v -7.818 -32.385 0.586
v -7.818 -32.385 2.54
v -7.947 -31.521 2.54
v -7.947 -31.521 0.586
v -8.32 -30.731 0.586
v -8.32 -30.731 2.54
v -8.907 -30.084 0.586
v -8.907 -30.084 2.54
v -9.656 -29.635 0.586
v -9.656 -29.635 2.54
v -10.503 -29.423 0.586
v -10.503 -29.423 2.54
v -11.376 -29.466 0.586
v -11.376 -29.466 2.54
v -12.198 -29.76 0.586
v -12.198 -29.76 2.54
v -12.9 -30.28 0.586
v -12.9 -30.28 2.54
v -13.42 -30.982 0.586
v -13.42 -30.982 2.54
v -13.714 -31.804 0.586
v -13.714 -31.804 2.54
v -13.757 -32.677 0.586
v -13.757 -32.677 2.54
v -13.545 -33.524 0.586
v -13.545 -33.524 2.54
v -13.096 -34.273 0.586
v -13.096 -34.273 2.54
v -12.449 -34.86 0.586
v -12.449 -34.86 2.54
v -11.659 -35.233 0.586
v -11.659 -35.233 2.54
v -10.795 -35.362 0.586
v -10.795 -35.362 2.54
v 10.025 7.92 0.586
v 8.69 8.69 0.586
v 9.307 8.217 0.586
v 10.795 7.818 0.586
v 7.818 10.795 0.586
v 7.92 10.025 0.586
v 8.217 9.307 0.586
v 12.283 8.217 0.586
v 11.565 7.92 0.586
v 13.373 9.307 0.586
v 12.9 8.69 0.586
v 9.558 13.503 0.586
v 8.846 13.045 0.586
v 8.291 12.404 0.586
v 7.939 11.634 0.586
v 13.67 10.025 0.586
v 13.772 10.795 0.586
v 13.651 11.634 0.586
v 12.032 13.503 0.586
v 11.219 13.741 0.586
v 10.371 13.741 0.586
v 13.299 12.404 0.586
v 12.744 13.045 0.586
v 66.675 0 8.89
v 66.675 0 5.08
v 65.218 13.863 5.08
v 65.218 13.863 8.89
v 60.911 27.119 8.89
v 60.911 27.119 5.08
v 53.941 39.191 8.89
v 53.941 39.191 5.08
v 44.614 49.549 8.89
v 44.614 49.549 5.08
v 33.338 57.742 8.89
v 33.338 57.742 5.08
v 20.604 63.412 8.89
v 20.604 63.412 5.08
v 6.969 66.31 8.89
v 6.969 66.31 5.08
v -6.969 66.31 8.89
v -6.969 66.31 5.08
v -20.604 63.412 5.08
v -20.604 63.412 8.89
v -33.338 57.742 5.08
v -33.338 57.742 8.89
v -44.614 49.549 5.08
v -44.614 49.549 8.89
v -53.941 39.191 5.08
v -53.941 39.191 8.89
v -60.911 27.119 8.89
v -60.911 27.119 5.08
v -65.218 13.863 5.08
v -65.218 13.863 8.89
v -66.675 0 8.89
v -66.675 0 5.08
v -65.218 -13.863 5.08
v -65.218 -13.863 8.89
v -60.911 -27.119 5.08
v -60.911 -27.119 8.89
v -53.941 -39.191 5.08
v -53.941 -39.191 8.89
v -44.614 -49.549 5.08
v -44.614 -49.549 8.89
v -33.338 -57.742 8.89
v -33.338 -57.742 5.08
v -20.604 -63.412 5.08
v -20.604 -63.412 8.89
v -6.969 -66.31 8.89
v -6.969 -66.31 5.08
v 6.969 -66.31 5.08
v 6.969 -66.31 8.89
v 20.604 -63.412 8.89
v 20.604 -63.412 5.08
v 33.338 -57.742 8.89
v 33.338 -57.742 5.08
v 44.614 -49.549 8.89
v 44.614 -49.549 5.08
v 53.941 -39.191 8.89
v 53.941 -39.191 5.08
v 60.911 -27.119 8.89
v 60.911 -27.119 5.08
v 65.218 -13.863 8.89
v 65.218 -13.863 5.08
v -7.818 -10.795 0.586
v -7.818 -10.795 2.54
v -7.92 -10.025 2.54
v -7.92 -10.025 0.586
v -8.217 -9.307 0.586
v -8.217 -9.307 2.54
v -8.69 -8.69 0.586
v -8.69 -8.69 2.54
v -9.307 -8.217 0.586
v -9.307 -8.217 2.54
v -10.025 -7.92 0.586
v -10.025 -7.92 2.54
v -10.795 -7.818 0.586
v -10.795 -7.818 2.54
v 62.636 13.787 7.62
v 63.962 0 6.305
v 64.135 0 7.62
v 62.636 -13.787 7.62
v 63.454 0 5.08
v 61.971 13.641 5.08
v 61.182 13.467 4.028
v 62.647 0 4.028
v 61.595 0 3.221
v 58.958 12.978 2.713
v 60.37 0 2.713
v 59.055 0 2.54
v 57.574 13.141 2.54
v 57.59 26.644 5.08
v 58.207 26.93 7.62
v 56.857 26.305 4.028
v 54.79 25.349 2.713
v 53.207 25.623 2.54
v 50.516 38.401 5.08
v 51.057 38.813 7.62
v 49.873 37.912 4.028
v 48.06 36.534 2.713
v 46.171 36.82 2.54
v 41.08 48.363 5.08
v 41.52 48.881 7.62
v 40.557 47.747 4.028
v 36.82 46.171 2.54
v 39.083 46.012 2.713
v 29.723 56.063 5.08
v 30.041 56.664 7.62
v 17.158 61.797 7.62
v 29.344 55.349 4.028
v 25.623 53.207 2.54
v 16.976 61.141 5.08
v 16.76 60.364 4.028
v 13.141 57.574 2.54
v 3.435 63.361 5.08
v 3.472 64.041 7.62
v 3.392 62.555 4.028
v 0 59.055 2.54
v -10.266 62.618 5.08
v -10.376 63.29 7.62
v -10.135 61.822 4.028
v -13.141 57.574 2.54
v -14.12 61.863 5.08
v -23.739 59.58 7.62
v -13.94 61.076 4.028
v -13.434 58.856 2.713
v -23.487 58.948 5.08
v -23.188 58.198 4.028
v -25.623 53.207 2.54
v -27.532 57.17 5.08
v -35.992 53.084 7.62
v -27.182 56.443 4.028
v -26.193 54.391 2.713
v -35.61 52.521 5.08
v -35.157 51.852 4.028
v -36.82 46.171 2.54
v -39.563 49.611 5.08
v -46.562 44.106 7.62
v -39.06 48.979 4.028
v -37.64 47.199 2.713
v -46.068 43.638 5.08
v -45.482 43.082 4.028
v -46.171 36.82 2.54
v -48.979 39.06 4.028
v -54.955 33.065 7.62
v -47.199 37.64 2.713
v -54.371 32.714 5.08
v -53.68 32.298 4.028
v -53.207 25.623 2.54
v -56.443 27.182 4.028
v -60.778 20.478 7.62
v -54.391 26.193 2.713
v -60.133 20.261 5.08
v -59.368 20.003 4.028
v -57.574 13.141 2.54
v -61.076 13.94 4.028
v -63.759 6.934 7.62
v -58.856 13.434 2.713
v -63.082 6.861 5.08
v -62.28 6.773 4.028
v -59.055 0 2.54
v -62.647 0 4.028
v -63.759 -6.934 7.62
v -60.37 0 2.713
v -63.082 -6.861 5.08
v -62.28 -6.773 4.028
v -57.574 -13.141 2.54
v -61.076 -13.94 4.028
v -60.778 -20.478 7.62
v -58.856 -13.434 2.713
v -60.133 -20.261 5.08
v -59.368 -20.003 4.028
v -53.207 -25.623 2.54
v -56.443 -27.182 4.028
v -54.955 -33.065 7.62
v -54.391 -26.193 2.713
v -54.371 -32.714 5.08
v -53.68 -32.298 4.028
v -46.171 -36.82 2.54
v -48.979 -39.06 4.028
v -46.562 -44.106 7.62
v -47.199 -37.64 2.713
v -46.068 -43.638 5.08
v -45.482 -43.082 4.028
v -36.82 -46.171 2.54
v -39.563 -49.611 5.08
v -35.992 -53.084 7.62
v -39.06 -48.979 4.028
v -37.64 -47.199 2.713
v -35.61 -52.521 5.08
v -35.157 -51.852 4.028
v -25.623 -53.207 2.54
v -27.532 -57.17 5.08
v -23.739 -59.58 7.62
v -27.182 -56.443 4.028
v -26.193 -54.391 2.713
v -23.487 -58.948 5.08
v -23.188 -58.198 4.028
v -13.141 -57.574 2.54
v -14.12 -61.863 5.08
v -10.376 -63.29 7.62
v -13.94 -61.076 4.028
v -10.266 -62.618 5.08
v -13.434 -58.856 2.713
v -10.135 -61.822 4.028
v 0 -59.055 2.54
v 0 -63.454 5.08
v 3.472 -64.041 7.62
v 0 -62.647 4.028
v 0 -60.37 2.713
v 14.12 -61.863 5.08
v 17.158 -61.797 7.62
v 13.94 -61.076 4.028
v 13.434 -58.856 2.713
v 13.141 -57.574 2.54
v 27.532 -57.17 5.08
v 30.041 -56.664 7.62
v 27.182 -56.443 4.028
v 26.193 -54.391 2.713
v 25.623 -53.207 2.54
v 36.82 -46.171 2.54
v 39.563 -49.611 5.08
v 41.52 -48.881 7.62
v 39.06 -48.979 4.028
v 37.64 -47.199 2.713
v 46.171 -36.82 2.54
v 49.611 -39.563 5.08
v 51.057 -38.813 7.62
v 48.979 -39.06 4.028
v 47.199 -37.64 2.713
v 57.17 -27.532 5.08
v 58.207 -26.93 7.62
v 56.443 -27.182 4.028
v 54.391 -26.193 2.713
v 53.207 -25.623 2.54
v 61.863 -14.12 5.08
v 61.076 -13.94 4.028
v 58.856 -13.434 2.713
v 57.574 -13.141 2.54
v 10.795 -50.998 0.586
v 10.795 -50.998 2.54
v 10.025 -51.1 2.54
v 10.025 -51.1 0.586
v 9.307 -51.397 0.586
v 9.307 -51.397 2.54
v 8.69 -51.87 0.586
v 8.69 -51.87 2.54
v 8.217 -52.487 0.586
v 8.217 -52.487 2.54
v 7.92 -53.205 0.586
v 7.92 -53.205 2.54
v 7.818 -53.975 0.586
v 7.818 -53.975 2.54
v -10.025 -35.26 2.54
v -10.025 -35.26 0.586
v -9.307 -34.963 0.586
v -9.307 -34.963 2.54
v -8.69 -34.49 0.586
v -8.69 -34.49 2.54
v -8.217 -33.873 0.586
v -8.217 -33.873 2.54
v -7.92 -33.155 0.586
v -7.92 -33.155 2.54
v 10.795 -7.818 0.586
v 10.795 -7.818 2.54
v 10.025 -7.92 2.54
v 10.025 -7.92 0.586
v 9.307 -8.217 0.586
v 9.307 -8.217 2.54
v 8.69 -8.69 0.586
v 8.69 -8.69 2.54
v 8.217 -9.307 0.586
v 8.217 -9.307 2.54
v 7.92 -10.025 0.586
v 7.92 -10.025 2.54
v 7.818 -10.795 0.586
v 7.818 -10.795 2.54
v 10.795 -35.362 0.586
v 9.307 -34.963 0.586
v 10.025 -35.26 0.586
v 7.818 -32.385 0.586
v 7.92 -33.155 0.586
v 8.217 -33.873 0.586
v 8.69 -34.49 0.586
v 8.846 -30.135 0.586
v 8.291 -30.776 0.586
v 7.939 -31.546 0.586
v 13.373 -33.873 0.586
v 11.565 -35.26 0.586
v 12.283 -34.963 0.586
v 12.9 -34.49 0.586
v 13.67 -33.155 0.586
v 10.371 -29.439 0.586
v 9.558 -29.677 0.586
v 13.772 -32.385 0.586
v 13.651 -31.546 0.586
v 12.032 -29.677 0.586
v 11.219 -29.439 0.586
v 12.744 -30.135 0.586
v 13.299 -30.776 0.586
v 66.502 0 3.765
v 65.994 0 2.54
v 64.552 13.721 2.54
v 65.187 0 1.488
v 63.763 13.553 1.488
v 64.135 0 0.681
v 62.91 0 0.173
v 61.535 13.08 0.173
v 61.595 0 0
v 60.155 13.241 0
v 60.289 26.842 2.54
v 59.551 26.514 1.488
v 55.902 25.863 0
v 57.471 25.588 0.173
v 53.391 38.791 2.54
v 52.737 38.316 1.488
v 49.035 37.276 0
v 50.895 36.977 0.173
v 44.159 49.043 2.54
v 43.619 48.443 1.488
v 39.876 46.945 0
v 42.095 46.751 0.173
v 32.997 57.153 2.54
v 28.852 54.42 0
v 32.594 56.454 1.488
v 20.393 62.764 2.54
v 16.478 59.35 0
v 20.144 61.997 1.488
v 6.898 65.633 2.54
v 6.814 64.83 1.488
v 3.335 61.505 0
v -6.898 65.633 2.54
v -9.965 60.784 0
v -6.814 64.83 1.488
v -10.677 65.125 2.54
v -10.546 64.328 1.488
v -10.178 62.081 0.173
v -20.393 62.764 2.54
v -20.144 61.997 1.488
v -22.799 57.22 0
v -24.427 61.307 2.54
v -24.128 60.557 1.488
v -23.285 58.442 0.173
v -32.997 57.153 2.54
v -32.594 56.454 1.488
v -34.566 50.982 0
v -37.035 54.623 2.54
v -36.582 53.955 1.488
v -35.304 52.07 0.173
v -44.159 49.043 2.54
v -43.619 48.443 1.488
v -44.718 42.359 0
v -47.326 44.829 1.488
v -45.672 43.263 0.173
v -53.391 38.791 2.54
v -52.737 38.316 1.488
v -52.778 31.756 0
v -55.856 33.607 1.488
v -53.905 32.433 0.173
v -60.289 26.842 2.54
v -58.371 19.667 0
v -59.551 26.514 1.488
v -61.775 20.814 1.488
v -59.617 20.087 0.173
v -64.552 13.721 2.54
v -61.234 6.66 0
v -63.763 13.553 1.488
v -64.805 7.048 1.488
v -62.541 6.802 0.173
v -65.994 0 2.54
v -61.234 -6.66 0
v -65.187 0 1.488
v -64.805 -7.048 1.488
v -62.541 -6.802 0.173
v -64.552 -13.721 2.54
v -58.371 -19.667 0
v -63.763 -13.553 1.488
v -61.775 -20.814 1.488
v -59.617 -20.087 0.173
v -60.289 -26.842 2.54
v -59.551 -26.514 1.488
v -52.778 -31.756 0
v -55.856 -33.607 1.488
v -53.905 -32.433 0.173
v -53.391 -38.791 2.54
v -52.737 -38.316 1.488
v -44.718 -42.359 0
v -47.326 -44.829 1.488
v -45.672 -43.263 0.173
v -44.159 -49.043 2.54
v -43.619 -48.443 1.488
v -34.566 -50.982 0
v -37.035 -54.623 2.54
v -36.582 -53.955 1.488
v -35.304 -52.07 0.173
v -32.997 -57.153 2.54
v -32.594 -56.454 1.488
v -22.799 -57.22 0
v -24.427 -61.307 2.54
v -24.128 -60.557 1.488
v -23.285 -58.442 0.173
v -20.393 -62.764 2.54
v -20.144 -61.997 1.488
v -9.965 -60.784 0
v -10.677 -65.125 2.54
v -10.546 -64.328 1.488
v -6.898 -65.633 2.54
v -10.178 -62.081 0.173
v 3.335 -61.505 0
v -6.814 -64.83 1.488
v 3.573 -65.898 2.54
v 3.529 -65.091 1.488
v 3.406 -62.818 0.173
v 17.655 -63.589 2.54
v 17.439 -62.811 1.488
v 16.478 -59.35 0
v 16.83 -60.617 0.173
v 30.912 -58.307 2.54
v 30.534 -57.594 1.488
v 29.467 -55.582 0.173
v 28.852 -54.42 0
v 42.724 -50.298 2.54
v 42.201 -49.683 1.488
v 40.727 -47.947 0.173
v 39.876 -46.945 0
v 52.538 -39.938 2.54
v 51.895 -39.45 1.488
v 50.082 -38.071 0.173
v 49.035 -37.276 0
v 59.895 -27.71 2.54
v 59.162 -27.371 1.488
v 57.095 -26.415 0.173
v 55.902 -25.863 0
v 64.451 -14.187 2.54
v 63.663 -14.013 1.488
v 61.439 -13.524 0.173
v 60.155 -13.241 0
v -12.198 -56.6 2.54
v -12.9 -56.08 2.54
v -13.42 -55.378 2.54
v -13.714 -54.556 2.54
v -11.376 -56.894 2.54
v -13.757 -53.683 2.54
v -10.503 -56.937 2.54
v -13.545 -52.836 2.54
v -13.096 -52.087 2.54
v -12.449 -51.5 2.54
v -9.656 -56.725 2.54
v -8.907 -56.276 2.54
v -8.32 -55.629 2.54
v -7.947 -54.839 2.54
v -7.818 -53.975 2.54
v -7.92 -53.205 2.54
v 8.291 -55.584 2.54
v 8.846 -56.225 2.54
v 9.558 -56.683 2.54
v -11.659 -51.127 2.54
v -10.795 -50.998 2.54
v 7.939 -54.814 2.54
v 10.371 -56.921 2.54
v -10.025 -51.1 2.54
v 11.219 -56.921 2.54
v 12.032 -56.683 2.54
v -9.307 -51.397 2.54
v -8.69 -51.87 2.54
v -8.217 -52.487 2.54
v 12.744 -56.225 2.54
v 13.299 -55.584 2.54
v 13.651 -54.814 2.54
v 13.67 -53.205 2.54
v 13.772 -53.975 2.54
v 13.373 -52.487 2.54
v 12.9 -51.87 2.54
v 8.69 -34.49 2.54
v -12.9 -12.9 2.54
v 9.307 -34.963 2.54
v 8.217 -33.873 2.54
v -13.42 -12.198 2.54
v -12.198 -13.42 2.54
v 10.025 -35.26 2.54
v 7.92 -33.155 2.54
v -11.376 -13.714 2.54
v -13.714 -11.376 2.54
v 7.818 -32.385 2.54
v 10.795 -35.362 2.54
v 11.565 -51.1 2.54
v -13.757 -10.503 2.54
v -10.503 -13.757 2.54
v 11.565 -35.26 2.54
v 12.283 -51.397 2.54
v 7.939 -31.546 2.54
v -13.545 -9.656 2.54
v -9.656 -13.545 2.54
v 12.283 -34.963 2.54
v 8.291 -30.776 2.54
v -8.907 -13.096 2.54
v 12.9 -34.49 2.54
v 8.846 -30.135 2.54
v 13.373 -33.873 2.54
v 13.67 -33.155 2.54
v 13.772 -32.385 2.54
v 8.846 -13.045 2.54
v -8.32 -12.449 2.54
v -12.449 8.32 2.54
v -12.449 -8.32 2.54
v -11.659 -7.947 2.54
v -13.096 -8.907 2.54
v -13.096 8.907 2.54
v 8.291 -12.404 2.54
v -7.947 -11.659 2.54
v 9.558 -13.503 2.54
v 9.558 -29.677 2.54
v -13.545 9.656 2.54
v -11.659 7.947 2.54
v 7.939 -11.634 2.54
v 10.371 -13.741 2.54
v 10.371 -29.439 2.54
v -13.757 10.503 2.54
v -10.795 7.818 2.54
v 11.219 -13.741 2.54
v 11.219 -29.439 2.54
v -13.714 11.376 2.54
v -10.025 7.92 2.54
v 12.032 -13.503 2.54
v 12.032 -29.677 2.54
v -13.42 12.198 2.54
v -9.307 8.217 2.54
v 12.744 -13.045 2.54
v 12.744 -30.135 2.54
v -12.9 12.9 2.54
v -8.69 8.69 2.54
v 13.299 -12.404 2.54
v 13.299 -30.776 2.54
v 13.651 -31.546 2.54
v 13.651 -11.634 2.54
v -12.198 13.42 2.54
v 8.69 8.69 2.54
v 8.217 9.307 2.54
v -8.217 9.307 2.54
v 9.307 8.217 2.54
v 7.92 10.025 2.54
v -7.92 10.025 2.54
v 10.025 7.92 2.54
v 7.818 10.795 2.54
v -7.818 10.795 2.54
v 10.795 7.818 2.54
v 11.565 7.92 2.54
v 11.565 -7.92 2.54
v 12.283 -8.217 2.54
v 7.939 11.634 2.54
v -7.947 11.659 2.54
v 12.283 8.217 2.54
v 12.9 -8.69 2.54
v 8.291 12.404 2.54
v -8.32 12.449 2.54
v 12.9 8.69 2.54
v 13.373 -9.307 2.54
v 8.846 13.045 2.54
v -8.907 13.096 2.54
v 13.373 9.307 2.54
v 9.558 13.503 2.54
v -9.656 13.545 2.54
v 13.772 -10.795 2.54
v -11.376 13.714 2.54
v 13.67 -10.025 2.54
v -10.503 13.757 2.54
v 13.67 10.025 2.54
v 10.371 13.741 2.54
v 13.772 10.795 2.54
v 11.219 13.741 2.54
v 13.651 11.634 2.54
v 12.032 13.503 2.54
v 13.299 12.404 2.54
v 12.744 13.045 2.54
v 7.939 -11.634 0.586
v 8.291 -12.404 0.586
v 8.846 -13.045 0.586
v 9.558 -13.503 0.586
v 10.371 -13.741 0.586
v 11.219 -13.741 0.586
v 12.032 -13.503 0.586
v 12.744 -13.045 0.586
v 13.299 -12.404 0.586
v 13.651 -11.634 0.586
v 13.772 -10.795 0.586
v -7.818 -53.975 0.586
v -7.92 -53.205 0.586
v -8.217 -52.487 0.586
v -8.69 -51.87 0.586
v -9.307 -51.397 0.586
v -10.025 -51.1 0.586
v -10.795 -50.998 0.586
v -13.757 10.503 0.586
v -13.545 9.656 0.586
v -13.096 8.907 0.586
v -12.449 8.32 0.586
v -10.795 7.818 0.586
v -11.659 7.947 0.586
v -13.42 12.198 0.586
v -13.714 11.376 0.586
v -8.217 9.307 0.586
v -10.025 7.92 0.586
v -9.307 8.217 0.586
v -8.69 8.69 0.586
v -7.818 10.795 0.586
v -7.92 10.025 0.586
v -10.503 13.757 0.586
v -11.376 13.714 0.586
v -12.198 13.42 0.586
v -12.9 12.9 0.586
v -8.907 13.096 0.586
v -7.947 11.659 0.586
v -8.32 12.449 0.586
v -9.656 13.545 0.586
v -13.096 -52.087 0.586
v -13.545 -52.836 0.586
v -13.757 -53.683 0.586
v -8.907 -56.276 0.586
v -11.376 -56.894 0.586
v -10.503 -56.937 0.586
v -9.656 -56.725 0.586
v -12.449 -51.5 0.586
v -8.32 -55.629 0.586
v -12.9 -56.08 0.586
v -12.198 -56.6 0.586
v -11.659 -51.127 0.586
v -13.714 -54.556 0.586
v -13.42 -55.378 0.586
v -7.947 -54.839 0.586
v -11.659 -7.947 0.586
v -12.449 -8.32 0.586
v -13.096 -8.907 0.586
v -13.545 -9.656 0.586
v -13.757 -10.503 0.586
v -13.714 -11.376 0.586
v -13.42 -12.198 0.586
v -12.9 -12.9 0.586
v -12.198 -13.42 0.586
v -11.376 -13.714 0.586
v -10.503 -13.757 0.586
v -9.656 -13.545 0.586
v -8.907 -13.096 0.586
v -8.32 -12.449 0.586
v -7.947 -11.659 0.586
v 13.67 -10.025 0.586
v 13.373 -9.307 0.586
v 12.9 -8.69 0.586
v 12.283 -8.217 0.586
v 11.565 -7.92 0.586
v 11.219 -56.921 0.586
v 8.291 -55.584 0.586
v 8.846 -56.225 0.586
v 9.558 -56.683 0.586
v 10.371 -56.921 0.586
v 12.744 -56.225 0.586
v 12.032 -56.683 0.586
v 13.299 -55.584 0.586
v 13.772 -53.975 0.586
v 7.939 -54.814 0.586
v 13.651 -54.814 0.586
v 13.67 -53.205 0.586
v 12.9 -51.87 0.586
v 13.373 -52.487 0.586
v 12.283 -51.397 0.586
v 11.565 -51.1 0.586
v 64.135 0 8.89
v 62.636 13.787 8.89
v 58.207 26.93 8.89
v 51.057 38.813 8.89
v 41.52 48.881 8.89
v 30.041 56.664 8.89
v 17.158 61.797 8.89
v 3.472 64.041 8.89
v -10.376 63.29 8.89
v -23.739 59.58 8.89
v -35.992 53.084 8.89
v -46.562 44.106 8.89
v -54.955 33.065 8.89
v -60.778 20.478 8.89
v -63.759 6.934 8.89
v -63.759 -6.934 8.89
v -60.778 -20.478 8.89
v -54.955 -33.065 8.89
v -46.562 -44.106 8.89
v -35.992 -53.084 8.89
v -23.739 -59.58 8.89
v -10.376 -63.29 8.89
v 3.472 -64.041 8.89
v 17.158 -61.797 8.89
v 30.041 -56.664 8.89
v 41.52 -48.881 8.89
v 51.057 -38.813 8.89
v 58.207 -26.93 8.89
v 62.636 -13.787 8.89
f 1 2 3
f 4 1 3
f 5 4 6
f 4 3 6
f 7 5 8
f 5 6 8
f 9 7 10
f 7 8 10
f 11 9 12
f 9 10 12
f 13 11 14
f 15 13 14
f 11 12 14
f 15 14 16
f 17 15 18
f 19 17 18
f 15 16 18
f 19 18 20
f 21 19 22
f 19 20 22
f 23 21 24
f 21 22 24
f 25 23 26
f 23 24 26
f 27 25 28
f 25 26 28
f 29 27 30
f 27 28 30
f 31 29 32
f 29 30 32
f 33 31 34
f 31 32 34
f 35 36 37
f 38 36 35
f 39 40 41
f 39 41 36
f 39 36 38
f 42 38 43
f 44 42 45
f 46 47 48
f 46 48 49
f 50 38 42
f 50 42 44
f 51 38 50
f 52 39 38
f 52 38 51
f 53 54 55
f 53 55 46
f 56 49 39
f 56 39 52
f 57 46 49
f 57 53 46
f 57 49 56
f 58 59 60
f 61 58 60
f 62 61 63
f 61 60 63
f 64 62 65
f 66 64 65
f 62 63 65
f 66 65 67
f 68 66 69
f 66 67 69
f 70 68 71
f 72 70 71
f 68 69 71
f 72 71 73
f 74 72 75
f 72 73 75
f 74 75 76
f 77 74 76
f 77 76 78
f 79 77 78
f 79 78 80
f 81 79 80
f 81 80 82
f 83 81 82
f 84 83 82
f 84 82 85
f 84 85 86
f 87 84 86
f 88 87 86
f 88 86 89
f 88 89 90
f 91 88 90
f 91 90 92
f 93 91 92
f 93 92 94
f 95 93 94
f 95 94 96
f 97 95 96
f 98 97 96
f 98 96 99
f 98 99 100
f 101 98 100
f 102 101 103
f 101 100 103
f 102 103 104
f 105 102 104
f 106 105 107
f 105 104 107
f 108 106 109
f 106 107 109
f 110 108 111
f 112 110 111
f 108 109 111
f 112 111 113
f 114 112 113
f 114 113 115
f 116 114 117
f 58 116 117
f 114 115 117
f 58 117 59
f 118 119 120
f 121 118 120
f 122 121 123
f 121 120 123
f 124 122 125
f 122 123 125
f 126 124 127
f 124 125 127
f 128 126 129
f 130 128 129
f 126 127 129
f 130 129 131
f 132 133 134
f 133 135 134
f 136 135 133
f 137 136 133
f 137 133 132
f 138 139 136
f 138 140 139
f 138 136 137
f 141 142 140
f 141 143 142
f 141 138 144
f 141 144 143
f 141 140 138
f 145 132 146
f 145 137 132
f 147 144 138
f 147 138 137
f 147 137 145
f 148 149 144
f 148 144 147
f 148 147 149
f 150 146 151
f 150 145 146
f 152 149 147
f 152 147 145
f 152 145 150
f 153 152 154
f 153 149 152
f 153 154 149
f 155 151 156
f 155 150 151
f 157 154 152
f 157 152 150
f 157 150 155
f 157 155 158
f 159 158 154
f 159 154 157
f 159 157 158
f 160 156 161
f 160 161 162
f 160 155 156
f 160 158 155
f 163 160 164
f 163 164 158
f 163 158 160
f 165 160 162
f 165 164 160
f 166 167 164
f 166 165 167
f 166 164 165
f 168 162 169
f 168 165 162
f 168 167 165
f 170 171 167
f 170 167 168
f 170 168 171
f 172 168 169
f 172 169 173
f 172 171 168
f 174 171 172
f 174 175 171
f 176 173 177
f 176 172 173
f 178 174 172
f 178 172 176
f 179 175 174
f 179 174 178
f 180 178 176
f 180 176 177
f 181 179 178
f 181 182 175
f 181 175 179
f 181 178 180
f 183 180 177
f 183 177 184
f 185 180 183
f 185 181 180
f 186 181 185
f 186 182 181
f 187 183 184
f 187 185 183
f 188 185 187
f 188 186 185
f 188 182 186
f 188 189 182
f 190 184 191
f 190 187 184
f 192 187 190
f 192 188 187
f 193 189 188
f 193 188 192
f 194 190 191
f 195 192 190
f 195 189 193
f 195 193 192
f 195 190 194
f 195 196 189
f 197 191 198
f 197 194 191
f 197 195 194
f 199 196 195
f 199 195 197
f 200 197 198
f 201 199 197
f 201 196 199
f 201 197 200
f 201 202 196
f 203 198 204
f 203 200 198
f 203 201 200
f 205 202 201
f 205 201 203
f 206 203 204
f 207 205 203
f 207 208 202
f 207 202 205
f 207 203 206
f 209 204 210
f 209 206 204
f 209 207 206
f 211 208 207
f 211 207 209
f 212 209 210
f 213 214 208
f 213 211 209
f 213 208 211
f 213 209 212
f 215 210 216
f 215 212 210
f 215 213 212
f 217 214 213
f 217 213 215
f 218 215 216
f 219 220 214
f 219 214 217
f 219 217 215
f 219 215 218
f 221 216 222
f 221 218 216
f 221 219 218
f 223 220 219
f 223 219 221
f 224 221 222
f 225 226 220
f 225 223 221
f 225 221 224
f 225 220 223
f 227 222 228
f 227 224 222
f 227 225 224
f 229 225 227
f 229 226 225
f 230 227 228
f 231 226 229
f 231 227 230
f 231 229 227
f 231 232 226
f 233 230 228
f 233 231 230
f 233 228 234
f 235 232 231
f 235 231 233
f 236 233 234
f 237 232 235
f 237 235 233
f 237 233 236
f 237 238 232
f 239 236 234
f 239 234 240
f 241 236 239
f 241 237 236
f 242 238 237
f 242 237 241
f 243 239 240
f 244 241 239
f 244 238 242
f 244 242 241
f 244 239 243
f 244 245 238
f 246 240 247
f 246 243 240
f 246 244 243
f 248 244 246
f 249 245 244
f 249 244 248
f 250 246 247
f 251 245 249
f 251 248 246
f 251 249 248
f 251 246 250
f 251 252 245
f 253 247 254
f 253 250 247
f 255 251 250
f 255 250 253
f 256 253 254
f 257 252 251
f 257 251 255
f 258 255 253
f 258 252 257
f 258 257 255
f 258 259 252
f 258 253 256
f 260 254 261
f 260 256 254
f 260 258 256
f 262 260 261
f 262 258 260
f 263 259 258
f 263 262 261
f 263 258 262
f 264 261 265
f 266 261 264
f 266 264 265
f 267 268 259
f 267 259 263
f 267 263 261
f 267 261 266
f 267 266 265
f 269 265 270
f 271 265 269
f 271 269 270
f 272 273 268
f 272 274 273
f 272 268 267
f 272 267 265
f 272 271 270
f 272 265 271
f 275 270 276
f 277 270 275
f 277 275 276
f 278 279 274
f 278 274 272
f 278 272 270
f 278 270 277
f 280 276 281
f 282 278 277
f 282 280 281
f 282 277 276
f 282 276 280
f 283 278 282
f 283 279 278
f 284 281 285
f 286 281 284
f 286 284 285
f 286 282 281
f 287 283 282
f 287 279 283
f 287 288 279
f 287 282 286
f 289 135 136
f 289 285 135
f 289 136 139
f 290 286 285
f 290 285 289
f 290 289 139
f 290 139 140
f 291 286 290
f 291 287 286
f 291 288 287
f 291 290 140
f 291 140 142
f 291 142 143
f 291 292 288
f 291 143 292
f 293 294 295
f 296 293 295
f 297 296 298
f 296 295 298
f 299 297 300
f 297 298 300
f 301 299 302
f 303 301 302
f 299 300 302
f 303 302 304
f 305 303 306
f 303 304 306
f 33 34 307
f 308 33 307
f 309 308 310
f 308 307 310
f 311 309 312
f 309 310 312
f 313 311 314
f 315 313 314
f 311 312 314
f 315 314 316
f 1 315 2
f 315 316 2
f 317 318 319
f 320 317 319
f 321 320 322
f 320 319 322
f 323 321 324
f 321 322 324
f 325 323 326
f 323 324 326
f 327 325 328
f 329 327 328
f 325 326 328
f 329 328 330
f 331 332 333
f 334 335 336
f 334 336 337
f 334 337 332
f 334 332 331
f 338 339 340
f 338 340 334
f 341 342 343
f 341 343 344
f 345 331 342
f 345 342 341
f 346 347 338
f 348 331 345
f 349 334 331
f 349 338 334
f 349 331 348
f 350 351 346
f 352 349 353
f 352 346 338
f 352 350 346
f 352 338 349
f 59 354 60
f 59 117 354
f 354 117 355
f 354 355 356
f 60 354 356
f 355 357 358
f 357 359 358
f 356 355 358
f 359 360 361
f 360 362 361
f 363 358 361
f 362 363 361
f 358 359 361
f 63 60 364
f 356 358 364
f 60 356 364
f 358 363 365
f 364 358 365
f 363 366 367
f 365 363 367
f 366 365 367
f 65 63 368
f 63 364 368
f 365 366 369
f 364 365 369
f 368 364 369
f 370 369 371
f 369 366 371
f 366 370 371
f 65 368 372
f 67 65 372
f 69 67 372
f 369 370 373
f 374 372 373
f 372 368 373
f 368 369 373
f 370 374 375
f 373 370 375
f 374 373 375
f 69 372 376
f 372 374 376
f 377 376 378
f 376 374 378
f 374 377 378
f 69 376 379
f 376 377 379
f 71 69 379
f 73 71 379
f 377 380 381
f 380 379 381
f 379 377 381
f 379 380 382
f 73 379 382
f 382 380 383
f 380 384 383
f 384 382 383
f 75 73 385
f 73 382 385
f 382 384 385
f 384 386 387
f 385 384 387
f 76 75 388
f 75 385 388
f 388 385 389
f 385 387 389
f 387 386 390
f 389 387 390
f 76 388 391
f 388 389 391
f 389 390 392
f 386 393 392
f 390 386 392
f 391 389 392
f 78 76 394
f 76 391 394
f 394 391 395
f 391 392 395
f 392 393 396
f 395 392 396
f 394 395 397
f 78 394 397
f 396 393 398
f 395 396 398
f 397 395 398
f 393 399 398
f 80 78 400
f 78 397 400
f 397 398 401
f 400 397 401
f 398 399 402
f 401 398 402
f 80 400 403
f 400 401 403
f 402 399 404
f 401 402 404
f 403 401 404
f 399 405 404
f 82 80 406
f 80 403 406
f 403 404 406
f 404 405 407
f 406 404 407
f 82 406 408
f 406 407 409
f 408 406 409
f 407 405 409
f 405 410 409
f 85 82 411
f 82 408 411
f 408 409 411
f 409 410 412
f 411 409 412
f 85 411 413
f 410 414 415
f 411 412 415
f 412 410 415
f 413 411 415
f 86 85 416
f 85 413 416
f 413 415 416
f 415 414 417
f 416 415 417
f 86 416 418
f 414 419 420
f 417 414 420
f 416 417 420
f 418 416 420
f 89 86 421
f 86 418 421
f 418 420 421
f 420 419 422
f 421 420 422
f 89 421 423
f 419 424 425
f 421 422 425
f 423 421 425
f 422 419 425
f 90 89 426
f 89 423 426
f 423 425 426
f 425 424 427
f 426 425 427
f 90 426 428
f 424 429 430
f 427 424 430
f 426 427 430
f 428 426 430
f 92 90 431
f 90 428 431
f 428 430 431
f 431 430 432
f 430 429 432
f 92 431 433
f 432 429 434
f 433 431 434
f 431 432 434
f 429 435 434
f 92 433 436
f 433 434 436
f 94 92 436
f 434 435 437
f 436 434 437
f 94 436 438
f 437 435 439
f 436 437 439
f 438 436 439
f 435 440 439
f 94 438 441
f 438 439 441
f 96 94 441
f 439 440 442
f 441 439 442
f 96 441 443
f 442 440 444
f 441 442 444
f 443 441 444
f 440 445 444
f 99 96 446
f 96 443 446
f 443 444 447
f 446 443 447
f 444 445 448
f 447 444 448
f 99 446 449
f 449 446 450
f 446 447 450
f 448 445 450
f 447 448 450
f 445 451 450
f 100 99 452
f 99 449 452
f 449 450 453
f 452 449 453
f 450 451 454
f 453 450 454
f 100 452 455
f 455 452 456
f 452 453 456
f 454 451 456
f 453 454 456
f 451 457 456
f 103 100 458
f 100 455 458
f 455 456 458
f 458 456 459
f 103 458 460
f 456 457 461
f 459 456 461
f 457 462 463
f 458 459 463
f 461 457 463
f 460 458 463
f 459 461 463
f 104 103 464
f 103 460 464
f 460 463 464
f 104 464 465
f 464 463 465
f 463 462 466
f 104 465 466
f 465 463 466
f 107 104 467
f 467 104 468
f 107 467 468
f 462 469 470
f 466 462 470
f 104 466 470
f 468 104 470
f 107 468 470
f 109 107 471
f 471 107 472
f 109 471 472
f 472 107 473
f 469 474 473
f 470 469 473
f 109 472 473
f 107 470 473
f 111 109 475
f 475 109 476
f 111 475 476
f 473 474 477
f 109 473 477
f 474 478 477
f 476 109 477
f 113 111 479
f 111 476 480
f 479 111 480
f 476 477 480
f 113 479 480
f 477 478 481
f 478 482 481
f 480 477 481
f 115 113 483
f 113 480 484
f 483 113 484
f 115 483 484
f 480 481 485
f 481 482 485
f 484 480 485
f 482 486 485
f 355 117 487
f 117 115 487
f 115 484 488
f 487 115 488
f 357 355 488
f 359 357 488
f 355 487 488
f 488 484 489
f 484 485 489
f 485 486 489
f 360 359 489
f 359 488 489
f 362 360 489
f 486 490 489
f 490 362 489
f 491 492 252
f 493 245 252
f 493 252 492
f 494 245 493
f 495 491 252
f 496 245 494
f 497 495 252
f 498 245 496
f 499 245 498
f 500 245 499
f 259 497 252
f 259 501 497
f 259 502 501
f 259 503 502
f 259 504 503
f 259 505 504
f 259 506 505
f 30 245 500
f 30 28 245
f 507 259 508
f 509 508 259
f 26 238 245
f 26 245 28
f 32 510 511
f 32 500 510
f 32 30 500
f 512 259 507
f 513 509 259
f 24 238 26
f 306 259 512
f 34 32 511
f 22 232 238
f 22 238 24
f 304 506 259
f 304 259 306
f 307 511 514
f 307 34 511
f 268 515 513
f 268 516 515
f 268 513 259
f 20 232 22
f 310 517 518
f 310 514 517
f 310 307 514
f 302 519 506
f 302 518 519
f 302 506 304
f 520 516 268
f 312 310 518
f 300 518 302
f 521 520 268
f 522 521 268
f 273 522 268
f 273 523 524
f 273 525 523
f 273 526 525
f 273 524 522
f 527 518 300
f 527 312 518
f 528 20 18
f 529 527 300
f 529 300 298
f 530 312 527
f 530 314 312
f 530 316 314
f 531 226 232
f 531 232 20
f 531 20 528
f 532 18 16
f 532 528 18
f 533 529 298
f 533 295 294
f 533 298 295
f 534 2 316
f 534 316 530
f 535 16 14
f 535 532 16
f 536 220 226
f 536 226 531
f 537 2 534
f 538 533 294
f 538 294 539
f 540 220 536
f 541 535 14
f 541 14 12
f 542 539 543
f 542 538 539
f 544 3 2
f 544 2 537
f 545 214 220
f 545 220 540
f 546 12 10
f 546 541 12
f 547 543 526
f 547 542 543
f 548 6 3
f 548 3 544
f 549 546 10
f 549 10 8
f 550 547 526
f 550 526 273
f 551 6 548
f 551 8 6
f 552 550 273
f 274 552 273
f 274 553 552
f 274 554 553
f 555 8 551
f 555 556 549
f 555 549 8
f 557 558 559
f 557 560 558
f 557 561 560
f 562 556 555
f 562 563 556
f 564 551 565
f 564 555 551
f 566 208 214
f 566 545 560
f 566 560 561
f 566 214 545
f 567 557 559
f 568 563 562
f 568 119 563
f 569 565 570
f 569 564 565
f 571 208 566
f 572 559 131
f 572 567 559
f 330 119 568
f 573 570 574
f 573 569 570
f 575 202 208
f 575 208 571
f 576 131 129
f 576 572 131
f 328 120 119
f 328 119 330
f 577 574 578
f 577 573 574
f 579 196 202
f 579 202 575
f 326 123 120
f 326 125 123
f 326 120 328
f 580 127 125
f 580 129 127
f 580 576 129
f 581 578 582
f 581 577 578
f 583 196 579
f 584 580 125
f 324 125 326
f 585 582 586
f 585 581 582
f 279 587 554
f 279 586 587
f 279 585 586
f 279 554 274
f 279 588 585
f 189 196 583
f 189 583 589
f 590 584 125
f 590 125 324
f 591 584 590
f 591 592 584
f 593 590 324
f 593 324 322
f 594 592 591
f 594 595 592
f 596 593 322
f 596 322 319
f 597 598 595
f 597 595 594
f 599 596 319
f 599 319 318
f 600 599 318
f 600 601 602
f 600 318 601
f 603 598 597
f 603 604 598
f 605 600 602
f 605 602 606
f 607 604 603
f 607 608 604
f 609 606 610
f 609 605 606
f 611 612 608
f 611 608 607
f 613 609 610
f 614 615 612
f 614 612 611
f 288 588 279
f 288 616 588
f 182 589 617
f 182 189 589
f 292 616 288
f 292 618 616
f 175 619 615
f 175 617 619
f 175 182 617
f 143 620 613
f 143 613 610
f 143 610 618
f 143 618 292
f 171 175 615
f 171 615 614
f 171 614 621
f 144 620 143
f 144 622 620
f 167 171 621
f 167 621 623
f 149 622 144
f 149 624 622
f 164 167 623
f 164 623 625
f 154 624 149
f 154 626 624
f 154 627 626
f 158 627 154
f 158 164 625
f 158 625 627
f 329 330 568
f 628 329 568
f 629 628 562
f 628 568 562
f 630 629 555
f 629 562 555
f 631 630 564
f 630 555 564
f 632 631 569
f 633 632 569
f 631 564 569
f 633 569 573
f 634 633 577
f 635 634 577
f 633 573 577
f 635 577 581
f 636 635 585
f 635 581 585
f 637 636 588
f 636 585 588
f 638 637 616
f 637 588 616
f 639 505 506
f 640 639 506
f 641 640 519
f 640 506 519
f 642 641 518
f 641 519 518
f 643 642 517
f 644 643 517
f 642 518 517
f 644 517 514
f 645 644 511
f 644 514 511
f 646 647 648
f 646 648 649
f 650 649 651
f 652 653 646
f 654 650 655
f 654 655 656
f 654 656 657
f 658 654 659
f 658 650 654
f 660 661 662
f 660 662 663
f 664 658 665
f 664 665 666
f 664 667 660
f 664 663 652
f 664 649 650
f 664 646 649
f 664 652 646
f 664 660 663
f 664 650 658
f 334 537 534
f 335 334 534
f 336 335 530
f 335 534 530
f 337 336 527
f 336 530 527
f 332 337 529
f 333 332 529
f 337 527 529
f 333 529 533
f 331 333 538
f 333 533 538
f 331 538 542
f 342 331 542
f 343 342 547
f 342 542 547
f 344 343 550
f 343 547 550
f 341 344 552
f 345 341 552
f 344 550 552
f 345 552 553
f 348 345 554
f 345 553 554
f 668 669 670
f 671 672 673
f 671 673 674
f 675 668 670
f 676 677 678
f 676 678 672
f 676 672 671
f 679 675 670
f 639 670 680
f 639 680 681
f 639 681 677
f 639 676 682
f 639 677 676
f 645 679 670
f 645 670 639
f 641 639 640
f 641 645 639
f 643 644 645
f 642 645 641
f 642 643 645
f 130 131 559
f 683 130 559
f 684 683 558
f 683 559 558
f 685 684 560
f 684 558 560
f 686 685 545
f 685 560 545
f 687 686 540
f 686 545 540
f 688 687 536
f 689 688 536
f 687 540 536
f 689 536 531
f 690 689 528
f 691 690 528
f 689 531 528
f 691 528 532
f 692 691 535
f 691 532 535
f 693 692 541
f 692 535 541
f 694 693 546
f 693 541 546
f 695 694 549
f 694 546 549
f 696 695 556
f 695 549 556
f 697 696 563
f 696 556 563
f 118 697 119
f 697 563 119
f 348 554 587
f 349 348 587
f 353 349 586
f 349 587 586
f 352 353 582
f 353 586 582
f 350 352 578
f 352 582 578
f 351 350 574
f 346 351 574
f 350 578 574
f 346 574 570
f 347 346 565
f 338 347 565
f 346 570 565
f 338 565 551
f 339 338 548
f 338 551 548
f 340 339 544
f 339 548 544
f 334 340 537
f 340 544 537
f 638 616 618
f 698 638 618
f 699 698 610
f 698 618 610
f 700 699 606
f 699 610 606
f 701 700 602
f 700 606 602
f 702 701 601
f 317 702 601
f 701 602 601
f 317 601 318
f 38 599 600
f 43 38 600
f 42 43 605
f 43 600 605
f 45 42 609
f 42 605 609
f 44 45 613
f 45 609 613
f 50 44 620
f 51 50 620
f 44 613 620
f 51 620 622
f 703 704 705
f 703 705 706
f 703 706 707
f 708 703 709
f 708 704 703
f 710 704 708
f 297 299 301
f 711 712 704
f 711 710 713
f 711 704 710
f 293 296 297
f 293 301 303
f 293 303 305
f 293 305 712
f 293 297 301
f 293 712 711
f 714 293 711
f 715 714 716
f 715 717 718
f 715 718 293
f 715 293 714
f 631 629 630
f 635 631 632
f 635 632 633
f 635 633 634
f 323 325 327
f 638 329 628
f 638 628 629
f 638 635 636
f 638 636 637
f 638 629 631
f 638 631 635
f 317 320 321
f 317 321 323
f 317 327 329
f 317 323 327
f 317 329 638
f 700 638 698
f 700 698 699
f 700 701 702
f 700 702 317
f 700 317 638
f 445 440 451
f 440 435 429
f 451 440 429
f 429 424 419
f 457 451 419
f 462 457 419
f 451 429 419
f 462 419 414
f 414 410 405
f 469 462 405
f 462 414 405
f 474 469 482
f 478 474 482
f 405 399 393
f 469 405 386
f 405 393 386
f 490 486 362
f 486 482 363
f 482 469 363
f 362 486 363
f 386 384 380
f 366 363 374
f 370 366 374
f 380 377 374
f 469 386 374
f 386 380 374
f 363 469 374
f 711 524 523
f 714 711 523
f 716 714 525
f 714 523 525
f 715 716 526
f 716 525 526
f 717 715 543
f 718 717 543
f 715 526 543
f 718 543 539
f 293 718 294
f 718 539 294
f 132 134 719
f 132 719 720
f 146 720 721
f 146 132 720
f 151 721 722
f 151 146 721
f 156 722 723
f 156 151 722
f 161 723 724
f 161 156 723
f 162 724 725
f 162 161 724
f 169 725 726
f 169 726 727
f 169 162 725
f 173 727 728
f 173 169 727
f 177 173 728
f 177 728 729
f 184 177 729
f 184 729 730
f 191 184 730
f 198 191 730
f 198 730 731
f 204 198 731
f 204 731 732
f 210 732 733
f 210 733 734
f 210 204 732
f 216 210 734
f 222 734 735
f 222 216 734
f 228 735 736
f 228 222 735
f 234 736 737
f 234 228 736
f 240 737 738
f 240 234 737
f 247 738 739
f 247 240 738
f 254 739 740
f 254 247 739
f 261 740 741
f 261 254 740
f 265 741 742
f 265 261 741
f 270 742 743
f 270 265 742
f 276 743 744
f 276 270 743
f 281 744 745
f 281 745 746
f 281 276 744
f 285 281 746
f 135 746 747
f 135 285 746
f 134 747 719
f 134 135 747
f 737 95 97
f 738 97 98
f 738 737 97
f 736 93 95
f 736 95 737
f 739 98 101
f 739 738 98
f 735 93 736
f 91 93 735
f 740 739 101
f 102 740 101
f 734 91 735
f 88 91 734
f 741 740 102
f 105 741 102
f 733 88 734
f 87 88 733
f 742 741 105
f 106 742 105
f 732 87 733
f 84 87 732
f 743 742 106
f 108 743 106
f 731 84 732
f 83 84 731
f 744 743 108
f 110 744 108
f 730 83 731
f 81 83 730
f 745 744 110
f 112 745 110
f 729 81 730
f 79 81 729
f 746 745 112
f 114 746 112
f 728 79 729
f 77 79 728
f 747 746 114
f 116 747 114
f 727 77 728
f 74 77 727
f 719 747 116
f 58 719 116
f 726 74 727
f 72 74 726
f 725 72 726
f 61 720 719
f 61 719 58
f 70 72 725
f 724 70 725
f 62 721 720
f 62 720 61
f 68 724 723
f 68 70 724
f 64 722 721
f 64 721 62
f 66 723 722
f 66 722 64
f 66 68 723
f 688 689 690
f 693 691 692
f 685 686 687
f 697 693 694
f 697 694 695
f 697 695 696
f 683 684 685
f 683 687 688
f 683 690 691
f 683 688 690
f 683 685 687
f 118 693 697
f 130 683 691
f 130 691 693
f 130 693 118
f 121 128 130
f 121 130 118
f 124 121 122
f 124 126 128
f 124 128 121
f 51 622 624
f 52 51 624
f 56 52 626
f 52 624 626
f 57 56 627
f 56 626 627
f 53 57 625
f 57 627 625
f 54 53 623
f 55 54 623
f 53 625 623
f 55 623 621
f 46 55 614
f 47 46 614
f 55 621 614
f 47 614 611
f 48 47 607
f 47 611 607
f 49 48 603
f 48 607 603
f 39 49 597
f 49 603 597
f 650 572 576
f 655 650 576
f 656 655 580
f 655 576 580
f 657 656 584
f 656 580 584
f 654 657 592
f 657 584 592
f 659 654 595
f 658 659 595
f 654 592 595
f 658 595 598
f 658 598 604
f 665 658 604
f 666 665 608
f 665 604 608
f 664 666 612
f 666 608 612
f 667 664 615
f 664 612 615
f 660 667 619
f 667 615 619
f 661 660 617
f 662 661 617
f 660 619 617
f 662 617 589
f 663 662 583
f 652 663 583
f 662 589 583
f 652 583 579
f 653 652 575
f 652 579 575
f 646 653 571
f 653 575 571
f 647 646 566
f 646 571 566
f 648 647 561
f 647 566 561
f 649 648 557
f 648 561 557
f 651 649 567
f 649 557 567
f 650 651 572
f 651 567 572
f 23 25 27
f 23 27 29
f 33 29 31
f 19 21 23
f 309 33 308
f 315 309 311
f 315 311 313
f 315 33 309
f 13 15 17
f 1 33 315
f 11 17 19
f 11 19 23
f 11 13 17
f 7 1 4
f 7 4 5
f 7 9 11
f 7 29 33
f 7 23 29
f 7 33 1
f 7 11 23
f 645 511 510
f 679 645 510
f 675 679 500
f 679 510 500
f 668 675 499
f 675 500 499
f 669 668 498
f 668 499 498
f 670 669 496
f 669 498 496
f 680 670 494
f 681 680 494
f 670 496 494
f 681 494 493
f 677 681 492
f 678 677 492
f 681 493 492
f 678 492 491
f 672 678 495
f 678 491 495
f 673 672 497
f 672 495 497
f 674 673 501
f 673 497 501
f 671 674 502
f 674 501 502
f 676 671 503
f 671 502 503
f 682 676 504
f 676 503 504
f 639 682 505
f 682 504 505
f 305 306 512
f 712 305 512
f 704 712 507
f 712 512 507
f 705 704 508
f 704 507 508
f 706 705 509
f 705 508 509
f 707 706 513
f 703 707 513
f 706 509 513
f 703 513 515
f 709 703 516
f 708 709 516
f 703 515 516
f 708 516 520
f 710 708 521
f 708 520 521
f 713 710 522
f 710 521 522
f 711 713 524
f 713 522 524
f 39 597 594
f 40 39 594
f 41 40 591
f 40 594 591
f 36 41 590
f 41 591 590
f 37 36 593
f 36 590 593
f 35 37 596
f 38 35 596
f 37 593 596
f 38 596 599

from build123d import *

# Parameters (mm, degrees)
F0_R     = 66.675
F1_DEPTH = 2.54
F2_R     = 66.675
F2_R_2   = 64.135
F3_DEPTH = 6.35
F4_R     = 5.08
F6_DEPTH = 1.9538461538


with BuildPart() as f1:
    # F0 (on Top) → F1 (new body)
    with BuildSketch(Plane.XY):
        Circle(F0_R)
    extrude(amount=F1_DEPTH)

    # F2 (on face) → F3 (join)
    with BuildSketch(Plane.XY.offset(2.54)):
        Circle(F2_R)
        Circle(F2_R_2, mode=Mode.SUBTRACT)
    extrude(amount=F3_DEPTH)

    # F4
    f4_edges = [f1.edges().sort_by_distance(p)[0] for p in [
        (-64.135, 0, 2.54),
        (-66.675, 0, 0),
    ]]
    fillet(f4_edges, radius=F4_R)

    # F5 (on face) → F6 (cut)
    with BuildSketch(Plane.XY.offset(2.54)):
        with BuildLine():
            Line((10.795, 10.795), (7.8184375, 10.795))
            ThreePointArc((7.8184375, 10.795), (8.6902524716, 8.6902524716), (10.795, 7.8184375))
            Line((10.795, 7.8184375), (10.795, 10.795))
        make_face()
        with BuildLine():
            ThreePointArc((13.7715625, 10.795), (10.795, 13.7715625), (7.8184375, 10.795))
            Line((7.8184375, 10.795), (10.795, 10.795))
            Line((10.795, 10.795), (10.795, 7.8184375))
            ThreePointArc((10.795, 7.8184375), (12.8997475284, 8.6902524716), (13.7715625, 10.795))
        make_face()
        with BuildLine():
            Line((-10.795, 10.795), (-7.8184375, 10.795))
            ThreePointArc((-7.8184375, 10.795), (-12.8997475284, 12.8997475284), (-10.795, 7.8184375))
            Line((-10.795, 7.8184375), (-10.795, 10.795))
        make_face()
        with BuildLine():
            ThreePointArc((-10.795, 7.8184375), (-8.6902524716, 8.6902524716), (-7.8184375, 10.795))
            Line((-7.8184375, 10.795), (-10.795, 10.795))
            Line((-10.795, 10.795), (-10.795, 7.8184375))
        make_face()
        with BuildLine():
            Line((10.795, -10.795), (10.795, -7.8184375))
            ThreePointArc((10.795, -7.8184375), (8.6902524716, -8.6902524716), (7.8184375, -10.795))
            Line((7.8184375, -10.795), (10.795, -10.795))
        make_face()
        with BuildLine():
            ThreePointArc((13.7715625, -10.795), (12.8997475284, -8.6902524716), (10.795, -7.8184375))
            Line((10.795, -7.8184375), (10.795, -10.795))
            Line((10.795, -10.795), (7.8184375, -10.795))
            ThreePointArc((7.8184375, -10.795), (10.795, -13.7715625), (13.7715625, -10.795))
        make_face()
        with BuildLine():
            ThreePointArc((-7.8184375, -10.795), (-8.6902524716, -8.6902524716), (-10.795, -7.8184375))
            Line((-10.795, -7.8184375), (-10.795, -10.795))
            Line((-10.795, -10.795), (-7.8184375, -10.795))
        make_face()
        with BuildLine():
            Line((-10.795, -10.795), (-10.795, -7.8184375))
            ThreePointArc((-10.795, -7.8184375), (-12.8997475284, -12.8997475284), (-7.8184375, -10.795))
            Line((-7.8184375, -10.795), (-10.795, -10.795))
        make_face()
        with BuildLine():
            Line((10.795, -32.385), (7.8184375, -32.385))
            ThreePointArc((7.8184375, -32.385), (8.6902524716, -34.4897475284), (10.795, -35.3615625))
            Line((10.795, -35.3615625), (10.795, -32.385))
        make_face()
        with BuildLine():
            ThreePointArc((13.7715625, -32.385), (10.795, -29.4084375), (7.8184375, -32.385))
            Line((7.8184375, -32.385), (10.795, -32.385))
            Line((10.795, -32.385), (10.795, -35.3615625))
            ThreePointArc((10.795, -35.3615625), (12.8997475284, -34.4897475284), (13.7715625, -32.385))
        make_face()
        with BuildLine():
            Line((-10.795, -32.385), (-7.8184375, -32.385))
            ThreePointArc((-7.8184375, -32.385), (-12.8997475284, -30.2802524716), (-10.795, -35.3615625))
            Line((-10.795, -35.3615625), (-10.795, -32.385))
        make_face()
        with BuildLine():
            ThreePointArc((-10.795, -35.3615625), (-8.6902524716, -34.4897475284), (-7.8184375, -32.385))
            Line((-7.8184375, -32.385), (-10.795, -32.385))
            Line((-10.795, -32.385), (-10.795, -35.3615625))
        make_face()
        with BuildLine():
            ThreePointArc((13.7715625, -53.975), (12.8997475284, -51.8702524716), (10.795, -50.9984375))
            Line((10.795, -50.9984375), (10.795, -53.975))
            Line((10.795, -53.975), (7.8184375, -53.975))
            ThreePointArc((7.8184375, -53.975), (10.795, -56.9515625), (13.7715625, -53.975))
        make_face()
        with BuildLine():
            Line((-10.795, -53.975), (-10.795, -50.9984375))
            ThreePointArc((-10.795, -50.9984375), (-12.8997475284, -56.0797475284), (-7.8184375, -53.975))
            Line((-7.8184375, -53.975), (-10.795, -53.975))
        make_face()
        with BuildLine():
            Line((10.795, -53.975), (10.795, -50.9984375))
            ThreePointArc((10.795, -50.9984375), (8.6902524716, -51.8702524716), (7.8184375, -53.975))
            Line((7.8184375, -53.975), (10.795, -53.975))
        make_face()
        with BuildLine():
            ThreePointArc((-7.8184375, -53.975), (-8.6902524716, -51.8702524716), (-10.795, -50.9984375))
            Line((-10.795, -50.9984375), (-10.795, -53.975))
            Line((-10.795, -53.975), (-7.8184375, -53.975))
        make_face()
    extrude(amount=-F6_DEPTH, mode=Mode.SUBTRACT)


solid = f1.part
